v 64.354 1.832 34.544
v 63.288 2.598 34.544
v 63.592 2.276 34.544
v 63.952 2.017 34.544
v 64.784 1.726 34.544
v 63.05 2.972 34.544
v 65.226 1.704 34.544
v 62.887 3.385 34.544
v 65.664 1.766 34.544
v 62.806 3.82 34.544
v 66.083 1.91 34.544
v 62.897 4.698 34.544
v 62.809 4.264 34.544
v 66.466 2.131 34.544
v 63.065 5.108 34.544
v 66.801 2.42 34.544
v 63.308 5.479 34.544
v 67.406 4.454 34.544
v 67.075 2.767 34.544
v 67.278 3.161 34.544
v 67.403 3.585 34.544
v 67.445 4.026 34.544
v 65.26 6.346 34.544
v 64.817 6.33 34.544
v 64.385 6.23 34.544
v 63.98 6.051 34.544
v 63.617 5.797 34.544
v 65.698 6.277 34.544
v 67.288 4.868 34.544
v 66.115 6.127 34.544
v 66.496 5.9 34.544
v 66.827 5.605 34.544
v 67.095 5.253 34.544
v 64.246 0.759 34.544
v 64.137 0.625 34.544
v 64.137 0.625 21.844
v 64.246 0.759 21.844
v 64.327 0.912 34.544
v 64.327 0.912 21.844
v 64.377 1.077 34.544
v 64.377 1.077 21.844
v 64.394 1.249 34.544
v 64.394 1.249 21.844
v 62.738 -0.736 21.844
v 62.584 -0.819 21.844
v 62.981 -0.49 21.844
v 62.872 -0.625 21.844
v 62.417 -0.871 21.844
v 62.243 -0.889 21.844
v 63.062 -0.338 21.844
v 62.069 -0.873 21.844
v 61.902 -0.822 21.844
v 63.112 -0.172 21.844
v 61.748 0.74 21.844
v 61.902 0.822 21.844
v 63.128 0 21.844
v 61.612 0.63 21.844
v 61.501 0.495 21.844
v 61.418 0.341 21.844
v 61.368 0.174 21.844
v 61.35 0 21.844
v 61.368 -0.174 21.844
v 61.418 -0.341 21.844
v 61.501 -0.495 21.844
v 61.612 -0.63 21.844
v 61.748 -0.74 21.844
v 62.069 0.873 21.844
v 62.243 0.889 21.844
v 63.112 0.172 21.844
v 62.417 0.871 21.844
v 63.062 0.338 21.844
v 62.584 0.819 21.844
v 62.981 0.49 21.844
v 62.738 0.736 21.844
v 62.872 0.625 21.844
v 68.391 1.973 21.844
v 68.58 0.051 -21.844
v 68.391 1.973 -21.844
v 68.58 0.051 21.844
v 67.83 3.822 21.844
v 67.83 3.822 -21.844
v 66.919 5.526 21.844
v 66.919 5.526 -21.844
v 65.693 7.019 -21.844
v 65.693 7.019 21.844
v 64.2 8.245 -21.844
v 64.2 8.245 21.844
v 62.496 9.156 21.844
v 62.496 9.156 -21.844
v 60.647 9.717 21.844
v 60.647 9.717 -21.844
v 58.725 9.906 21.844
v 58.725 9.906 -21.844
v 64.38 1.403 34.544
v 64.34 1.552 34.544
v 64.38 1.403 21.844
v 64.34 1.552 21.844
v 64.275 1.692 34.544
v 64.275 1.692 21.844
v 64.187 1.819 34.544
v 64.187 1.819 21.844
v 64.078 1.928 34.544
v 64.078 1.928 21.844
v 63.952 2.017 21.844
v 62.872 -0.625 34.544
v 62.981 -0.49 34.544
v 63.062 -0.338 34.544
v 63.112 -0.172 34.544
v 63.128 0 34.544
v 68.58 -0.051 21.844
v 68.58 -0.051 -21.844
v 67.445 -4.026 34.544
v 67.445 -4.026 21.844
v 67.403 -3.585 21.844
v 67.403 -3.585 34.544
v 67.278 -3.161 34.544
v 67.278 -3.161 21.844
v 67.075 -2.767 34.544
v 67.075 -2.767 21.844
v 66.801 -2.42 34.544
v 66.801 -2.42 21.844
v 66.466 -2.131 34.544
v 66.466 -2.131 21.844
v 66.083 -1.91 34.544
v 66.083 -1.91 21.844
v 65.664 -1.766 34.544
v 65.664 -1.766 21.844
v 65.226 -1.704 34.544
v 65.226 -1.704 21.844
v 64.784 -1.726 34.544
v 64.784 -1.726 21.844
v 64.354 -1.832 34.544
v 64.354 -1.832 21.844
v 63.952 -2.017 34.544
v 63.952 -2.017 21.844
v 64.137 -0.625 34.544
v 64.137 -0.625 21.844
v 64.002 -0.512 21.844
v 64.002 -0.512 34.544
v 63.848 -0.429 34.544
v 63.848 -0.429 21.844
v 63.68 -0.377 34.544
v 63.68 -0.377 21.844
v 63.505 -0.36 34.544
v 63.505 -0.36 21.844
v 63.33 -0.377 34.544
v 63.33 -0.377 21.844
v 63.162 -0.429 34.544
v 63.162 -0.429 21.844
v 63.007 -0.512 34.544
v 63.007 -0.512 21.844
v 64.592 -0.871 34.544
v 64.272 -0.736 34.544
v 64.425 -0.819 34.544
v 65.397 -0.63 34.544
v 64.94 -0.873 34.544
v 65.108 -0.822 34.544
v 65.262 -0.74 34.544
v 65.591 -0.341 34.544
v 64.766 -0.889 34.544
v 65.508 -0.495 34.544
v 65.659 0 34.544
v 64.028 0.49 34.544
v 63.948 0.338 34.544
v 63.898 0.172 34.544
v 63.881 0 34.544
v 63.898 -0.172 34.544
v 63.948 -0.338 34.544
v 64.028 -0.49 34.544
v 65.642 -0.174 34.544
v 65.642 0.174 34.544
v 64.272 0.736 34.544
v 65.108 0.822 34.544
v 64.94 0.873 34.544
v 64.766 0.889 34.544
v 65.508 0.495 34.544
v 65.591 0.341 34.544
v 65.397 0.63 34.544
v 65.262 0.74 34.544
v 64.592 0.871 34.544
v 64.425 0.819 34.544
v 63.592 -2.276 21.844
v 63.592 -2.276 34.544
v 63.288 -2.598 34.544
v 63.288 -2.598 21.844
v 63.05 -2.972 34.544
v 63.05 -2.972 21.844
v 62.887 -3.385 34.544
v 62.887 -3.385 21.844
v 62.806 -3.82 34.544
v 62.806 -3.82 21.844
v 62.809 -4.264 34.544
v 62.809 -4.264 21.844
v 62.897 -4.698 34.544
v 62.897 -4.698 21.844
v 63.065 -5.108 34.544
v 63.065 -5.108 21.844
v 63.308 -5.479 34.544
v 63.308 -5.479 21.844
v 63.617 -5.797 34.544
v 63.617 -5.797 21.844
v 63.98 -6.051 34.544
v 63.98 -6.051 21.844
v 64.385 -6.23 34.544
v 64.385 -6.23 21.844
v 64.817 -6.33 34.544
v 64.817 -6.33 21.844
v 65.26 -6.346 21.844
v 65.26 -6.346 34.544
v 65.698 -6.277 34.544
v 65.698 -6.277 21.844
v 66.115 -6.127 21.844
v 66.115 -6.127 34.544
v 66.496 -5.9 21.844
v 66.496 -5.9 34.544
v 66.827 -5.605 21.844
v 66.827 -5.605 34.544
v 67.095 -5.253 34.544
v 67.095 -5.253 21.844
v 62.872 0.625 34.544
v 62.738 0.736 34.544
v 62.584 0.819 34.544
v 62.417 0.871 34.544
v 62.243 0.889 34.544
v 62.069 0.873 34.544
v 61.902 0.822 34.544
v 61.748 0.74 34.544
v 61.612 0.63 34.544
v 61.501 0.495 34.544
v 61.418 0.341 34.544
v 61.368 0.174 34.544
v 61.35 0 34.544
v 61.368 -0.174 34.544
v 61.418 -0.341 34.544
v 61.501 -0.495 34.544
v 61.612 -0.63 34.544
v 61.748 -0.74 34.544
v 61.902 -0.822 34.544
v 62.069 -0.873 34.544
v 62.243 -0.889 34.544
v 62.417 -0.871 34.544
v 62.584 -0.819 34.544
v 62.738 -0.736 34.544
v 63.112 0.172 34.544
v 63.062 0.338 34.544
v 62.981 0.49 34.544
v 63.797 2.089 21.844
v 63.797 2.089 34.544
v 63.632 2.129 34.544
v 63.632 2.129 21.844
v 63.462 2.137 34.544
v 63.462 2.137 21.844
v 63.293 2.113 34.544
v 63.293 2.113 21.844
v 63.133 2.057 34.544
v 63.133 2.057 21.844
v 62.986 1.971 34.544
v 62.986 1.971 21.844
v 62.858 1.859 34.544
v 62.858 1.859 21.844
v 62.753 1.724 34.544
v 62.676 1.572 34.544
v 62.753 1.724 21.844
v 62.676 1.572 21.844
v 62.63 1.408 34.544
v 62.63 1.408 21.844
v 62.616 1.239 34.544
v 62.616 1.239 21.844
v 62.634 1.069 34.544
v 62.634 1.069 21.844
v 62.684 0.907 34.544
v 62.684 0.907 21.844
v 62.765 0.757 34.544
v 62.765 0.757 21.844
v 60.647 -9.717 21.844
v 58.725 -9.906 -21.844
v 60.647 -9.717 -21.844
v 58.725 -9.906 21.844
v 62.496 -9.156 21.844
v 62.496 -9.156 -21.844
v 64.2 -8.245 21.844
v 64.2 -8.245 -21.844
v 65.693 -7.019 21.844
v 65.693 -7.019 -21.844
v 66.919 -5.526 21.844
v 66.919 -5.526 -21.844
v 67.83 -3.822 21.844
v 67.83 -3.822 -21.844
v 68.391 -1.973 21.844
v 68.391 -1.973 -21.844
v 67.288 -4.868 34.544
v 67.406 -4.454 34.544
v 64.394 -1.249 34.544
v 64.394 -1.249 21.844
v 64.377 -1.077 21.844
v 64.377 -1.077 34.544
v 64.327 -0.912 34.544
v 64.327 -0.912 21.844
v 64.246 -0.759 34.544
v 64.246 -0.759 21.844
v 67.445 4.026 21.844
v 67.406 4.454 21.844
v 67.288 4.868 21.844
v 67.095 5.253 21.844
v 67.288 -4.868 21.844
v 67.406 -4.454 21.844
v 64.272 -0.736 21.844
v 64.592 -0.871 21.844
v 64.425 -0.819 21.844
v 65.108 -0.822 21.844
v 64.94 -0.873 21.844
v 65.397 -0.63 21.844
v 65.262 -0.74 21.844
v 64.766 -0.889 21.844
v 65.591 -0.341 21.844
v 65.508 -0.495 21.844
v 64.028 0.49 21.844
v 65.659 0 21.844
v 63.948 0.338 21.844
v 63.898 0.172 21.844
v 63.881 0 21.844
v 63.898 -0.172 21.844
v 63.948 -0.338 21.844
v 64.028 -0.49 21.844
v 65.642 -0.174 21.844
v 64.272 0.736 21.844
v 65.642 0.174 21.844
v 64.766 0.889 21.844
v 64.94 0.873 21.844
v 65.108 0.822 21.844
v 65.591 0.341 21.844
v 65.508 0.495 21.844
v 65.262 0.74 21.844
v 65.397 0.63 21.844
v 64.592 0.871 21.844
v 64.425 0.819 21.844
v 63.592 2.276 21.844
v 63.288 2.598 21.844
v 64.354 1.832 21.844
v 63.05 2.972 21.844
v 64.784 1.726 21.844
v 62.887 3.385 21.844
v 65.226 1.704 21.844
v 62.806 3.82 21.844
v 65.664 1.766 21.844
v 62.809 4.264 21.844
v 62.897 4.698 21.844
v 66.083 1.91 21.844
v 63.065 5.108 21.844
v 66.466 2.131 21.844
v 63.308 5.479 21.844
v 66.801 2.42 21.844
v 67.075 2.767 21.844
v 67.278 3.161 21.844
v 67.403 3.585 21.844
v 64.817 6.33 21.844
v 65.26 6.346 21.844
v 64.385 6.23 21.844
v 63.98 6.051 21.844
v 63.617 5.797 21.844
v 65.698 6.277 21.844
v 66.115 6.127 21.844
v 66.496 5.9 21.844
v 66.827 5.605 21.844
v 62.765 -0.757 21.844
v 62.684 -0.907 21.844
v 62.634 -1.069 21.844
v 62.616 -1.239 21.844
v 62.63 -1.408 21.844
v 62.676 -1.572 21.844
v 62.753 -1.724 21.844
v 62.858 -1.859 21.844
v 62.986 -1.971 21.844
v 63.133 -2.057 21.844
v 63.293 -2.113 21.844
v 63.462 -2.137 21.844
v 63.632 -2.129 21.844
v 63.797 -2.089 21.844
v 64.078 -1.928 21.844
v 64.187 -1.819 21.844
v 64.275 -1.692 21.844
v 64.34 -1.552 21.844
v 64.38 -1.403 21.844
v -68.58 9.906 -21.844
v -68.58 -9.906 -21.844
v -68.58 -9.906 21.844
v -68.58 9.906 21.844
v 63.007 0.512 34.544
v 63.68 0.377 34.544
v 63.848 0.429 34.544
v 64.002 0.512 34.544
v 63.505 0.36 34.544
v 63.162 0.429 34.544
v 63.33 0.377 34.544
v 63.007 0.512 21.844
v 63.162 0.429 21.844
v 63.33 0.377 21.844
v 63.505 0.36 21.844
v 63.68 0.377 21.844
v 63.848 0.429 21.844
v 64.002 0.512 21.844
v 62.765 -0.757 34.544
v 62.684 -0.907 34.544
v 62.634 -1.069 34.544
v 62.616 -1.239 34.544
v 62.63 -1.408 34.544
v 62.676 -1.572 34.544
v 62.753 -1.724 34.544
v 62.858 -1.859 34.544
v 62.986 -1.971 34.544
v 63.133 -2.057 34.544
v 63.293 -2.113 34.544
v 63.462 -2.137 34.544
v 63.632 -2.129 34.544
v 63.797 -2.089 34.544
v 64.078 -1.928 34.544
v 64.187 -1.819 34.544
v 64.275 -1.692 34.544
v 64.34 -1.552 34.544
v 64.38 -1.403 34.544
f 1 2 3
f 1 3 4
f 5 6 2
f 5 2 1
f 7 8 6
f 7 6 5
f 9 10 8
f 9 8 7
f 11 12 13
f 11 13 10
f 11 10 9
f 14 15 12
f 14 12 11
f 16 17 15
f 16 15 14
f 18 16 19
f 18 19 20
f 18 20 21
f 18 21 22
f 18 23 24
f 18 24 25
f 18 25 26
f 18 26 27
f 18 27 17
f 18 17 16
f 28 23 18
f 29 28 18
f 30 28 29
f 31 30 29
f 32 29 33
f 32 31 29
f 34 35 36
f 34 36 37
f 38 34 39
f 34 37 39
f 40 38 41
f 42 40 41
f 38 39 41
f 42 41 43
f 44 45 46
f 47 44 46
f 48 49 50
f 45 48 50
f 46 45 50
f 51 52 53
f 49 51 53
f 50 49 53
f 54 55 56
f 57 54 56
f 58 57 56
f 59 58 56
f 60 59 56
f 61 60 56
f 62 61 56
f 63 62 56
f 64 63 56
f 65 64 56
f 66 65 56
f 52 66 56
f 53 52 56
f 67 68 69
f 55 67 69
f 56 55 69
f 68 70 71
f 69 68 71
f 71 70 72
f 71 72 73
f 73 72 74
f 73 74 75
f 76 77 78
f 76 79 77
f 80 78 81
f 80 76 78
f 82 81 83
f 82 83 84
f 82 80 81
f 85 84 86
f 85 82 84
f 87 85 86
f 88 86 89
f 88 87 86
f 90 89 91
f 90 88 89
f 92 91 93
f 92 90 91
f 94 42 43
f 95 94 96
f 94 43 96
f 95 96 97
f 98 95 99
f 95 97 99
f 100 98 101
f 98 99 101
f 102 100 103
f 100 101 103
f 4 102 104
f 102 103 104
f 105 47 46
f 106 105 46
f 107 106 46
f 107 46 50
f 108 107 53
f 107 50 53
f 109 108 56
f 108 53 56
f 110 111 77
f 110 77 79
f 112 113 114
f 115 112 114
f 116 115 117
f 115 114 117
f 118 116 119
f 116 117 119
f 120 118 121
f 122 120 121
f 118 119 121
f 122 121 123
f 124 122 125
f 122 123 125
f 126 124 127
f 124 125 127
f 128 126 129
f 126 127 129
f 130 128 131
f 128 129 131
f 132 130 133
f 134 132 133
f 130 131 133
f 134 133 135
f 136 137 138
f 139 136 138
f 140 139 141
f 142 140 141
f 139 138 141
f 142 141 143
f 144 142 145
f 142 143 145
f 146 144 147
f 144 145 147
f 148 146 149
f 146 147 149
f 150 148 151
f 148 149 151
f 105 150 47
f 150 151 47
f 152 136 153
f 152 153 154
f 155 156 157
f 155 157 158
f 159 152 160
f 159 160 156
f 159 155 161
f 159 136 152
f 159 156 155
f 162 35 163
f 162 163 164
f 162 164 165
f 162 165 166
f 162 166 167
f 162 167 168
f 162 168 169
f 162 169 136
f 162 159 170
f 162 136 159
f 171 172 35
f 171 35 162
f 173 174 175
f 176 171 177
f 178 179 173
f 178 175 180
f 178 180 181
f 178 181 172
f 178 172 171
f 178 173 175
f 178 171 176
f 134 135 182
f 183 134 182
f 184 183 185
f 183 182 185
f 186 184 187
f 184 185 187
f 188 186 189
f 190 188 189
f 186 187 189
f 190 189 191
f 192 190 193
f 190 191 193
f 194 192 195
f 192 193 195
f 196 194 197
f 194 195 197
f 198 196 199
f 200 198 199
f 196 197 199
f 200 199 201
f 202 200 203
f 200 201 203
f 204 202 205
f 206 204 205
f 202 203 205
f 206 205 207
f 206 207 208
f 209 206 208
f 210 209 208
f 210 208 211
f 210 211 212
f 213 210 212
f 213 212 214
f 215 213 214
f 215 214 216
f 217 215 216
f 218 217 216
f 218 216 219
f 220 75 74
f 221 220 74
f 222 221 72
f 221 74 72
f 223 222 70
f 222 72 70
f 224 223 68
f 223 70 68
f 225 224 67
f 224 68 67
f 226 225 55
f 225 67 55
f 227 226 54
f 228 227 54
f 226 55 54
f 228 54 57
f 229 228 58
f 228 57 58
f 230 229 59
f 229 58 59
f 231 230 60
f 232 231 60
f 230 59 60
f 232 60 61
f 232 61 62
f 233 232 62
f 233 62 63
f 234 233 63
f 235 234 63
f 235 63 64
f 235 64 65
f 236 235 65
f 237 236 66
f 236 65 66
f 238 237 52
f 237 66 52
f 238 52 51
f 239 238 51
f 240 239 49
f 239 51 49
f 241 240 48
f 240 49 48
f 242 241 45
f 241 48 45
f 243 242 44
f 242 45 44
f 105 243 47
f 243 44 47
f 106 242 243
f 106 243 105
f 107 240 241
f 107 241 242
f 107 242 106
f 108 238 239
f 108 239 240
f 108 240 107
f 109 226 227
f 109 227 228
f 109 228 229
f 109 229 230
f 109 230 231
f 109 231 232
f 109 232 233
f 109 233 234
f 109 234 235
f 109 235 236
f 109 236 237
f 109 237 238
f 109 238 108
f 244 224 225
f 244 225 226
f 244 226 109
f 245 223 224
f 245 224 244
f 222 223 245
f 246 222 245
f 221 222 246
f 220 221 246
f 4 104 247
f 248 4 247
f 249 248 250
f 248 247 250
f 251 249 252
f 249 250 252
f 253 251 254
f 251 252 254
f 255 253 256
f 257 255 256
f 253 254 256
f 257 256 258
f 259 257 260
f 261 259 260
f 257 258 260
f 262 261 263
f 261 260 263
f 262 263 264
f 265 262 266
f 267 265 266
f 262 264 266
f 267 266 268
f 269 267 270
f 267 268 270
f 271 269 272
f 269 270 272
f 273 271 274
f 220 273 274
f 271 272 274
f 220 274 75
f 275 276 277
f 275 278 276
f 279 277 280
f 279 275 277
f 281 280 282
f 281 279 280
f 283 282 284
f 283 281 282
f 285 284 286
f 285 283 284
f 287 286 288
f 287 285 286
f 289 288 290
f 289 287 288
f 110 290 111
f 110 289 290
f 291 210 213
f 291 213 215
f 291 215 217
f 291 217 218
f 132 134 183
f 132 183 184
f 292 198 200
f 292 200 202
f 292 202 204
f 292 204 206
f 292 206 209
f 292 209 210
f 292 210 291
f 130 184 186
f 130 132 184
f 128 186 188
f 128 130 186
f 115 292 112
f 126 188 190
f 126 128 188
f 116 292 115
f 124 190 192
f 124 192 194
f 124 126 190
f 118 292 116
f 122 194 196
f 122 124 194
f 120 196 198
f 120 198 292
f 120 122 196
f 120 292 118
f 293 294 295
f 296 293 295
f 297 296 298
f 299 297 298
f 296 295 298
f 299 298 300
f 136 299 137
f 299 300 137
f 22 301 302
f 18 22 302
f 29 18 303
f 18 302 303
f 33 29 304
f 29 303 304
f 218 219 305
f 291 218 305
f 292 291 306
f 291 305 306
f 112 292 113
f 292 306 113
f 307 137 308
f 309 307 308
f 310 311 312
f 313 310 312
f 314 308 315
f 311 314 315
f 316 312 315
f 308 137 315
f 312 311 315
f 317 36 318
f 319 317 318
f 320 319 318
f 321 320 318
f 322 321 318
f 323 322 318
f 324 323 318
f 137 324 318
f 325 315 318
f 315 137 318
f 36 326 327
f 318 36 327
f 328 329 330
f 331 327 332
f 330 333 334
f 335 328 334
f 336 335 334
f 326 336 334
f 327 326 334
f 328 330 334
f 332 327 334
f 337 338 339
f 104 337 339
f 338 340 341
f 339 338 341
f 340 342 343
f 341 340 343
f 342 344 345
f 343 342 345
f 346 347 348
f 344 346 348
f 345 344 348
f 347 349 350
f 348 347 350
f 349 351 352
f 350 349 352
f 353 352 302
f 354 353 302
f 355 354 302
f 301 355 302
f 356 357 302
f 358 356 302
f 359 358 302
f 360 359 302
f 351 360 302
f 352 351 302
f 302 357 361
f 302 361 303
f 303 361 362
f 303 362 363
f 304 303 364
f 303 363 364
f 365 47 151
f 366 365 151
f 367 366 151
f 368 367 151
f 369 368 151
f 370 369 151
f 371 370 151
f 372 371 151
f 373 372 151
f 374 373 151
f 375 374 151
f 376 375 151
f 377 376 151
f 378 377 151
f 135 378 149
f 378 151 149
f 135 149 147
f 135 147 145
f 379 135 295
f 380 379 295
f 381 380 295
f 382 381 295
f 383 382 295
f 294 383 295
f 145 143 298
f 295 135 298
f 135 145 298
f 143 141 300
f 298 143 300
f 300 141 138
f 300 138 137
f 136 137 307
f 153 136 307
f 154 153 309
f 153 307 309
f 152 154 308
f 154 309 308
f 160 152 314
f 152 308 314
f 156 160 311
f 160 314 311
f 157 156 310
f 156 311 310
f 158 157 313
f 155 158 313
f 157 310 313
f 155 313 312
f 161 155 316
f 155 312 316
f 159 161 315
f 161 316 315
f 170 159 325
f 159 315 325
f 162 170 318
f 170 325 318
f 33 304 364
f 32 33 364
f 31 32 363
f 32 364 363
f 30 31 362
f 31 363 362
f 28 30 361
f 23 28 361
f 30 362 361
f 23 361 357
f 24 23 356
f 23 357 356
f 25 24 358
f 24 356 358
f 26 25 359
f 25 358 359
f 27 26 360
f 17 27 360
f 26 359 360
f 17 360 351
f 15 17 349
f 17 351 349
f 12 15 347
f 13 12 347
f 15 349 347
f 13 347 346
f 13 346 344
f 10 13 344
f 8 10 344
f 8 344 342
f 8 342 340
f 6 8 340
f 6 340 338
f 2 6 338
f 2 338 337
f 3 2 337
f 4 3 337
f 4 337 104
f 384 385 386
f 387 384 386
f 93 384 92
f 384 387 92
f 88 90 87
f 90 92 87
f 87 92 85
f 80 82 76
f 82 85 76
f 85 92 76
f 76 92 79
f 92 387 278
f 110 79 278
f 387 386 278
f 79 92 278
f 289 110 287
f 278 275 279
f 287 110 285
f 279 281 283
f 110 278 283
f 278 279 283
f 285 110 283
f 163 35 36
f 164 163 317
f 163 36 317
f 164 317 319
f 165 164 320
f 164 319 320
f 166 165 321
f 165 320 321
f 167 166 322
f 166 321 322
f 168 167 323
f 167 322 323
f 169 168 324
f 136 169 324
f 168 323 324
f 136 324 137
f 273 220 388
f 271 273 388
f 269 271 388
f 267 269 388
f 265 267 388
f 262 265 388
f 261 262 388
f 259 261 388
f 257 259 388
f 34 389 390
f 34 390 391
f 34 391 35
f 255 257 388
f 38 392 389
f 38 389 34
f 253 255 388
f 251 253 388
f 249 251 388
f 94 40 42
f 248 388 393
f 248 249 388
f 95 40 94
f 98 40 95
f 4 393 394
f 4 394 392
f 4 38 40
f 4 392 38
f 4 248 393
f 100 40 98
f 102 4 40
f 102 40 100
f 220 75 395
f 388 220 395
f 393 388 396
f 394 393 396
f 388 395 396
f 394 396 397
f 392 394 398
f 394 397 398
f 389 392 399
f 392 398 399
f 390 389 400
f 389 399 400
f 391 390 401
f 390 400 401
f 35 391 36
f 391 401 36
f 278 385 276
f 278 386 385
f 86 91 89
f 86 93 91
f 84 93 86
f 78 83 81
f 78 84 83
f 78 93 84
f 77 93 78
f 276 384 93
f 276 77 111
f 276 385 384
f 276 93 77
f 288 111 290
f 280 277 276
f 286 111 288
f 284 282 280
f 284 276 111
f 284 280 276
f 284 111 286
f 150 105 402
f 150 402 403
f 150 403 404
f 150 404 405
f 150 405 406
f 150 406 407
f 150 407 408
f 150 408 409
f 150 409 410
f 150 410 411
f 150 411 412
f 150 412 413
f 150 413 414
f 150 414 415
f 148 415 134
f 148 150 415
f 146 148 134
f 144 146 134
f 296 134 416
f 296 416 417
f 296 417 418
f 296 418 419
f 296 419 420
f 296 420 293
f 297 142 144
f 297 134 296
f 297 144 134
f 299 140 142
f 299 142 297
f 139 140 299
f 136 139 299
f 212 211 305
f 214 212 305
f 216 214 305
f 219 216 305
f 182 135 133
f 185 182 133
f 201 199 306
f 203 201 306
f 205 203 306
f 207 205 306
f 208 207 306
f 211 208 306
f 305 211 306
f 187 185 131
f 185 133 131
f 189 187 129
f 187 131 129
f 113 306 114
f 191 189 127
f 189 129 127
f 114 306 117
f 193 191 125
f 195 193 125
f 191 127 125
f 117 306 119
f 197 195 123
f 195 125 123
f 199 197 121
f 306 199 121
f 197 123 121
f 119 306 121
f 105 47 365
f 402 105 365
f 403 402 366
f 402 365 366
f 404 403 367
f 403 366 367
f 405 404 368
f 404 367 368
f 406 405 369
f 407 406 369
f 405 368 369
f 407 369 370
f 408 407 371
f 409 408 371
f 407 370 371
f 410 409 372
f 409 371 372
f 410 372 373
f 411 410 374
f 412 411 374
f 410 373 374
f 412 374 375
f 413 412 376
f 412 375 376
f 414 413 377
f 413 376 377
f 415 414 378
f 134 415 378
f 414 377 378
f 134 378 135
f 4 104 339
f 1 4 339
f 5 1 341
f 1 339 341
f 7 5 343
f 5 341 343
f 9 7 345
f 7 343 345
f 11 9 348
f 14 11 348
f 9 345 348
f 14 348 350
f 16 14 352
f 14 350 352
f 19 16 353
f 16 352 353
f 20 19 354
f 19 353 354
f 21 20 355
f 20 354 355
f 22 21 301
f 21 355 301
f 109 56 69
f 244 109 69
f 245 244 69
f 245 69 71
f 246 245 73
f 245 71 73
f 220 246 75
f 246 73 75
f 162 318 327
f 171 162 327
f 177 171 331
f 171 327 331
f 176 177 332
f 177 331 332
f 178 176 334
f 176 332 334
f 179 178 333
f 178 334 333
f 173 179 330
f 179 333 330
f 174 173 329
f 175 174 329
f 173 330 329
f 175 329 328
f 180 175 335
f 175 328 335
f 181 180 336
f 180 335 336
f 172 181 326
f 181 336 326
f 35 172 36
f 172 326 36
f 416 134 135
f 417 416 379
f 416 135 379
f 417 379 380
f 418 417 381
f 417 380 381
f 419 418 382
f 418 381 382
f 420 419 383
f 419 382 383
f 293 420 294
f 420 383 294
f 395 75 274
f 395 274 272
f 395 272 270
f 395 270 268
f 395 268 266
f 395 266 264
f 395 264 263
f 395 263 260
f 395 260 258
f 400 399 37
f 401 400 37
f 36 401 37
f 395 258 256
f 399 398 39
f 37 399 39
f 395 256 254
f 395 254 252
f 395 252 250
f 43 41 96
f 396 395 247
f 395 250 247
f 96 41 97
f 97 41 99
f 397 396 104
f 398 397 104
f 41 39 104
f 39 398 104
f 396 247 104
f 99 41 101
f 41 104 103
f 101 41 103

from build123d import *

# Parameters (mm, degrees)
F0_W     = 137.16
F0_H     = 43.688
F1_DEPTH = 9.906
F2_R     = 9.8552
F4_DEPTH = 12.7


with BuildPart() as f1:
    # F0 (on Front) → F1 (new body, symmetric)
    with BuildSketch(Plane.XZ):
        Rectangle(F0_W, F0_H)
    extrude(amount=F1_DEPTH, both=True)

    # F2
    f2_edges = [f1.edges().sort_by_distance(p)[0] for p in [
        (68.58, -9.906, 0),
        (68.58, 9.906, 0),
    ]]
    fillet(f2_edges, radius=F2_R)


with BuildPart() as f4:
    # F3 (on face) → F4 (new body)
    with BuildSketch(Plane.XY.offset(21.844)):
        with BuildLine():
            ThreePointArc((64.393712, 1.249132), (64.275415, 1.692232), (63.952007, 2.017407))
            ThreePointArc((63.952007, 2.017407), (62.802152, 1.793861), (62.872068, 0.624566))
            ThreePointArc((62.872068, 0.624566), (63.504712, 0.360132), (64.137356, 0.624566))
            ThreePointArc((64.137356, 0.624566), (64.327129, 0.911566), (64.393712, 1.249132))
        make_face()
        with BuildLine():
            ThreePointArc((63.128423, 0), (63.061841, 0.337565), (62.872068, 0.624566))
            ThreePointArc((62.872068, 0.624566), (61.350423, 0), (62.872068, -0.624566))
            ThreePointArc((62.872068, -0.624566), (63.061841, -0.337565), (63.128423, 0))
        make_face()
        with BuildLine():
            ThreePointArc((64.137356, -0.624566), (63.504712, -0.360132), (62.872068, -0.624566))
            ThreePointArc((62.872068, -0.624566), (62.802152, -1.793861), (63.952007, -2.017407))
            ThreePointArc((63.952007, -2.017407), (64.275415, -1.692232), (64.393712, -1.249132))
            ThreePointArc((64.393712, -1.249132), (64.327129, -0.911566), (64.137356, -0.624566))
        make_face()
        with BuildLine():
            ThreePointArc((65.659, 0), (65.107565, 0.822418), (64.137356, 0.624566))
            ThreePointArc((64.137356, 0.624566), (63.881, 0), (64.137356, -0.624566))
            ThreePointArc((64.137356, -0.624566), (65.107565, -0.822418), (65.659, 0))
        make_face()
        with BuildLine():
            ThreePointArc((63.952007, 2.017407), (66.279755, 2.011062), (67.445465, 4.0259))
            ThreePointArc((67.445465, 4.0259), (67.356222, 4.663751), (67.095348, 5.252617))
            ThreePointArc((67.095348, 5.252617), (63.454482, 5.645449), (63.952007, 2.017407))
        make_face()
        with BuildLine():
            ThreePointArc((63.952007, -2.017407), (63.454482, -5.645449), (67.095348, -5.252617))
            ThreePointArc((67.095348, -5.252617), (67.356222, -4.663751), (67.445465, -4.0259))
            ThreePointArc((67.445465, -4.0259), (66.279755, -2.011062), (63.952007, -2.017407))
        make_face()
    extrude(amount=F4_DEPTH)


solid = Compound([f1.part, f4.part])
